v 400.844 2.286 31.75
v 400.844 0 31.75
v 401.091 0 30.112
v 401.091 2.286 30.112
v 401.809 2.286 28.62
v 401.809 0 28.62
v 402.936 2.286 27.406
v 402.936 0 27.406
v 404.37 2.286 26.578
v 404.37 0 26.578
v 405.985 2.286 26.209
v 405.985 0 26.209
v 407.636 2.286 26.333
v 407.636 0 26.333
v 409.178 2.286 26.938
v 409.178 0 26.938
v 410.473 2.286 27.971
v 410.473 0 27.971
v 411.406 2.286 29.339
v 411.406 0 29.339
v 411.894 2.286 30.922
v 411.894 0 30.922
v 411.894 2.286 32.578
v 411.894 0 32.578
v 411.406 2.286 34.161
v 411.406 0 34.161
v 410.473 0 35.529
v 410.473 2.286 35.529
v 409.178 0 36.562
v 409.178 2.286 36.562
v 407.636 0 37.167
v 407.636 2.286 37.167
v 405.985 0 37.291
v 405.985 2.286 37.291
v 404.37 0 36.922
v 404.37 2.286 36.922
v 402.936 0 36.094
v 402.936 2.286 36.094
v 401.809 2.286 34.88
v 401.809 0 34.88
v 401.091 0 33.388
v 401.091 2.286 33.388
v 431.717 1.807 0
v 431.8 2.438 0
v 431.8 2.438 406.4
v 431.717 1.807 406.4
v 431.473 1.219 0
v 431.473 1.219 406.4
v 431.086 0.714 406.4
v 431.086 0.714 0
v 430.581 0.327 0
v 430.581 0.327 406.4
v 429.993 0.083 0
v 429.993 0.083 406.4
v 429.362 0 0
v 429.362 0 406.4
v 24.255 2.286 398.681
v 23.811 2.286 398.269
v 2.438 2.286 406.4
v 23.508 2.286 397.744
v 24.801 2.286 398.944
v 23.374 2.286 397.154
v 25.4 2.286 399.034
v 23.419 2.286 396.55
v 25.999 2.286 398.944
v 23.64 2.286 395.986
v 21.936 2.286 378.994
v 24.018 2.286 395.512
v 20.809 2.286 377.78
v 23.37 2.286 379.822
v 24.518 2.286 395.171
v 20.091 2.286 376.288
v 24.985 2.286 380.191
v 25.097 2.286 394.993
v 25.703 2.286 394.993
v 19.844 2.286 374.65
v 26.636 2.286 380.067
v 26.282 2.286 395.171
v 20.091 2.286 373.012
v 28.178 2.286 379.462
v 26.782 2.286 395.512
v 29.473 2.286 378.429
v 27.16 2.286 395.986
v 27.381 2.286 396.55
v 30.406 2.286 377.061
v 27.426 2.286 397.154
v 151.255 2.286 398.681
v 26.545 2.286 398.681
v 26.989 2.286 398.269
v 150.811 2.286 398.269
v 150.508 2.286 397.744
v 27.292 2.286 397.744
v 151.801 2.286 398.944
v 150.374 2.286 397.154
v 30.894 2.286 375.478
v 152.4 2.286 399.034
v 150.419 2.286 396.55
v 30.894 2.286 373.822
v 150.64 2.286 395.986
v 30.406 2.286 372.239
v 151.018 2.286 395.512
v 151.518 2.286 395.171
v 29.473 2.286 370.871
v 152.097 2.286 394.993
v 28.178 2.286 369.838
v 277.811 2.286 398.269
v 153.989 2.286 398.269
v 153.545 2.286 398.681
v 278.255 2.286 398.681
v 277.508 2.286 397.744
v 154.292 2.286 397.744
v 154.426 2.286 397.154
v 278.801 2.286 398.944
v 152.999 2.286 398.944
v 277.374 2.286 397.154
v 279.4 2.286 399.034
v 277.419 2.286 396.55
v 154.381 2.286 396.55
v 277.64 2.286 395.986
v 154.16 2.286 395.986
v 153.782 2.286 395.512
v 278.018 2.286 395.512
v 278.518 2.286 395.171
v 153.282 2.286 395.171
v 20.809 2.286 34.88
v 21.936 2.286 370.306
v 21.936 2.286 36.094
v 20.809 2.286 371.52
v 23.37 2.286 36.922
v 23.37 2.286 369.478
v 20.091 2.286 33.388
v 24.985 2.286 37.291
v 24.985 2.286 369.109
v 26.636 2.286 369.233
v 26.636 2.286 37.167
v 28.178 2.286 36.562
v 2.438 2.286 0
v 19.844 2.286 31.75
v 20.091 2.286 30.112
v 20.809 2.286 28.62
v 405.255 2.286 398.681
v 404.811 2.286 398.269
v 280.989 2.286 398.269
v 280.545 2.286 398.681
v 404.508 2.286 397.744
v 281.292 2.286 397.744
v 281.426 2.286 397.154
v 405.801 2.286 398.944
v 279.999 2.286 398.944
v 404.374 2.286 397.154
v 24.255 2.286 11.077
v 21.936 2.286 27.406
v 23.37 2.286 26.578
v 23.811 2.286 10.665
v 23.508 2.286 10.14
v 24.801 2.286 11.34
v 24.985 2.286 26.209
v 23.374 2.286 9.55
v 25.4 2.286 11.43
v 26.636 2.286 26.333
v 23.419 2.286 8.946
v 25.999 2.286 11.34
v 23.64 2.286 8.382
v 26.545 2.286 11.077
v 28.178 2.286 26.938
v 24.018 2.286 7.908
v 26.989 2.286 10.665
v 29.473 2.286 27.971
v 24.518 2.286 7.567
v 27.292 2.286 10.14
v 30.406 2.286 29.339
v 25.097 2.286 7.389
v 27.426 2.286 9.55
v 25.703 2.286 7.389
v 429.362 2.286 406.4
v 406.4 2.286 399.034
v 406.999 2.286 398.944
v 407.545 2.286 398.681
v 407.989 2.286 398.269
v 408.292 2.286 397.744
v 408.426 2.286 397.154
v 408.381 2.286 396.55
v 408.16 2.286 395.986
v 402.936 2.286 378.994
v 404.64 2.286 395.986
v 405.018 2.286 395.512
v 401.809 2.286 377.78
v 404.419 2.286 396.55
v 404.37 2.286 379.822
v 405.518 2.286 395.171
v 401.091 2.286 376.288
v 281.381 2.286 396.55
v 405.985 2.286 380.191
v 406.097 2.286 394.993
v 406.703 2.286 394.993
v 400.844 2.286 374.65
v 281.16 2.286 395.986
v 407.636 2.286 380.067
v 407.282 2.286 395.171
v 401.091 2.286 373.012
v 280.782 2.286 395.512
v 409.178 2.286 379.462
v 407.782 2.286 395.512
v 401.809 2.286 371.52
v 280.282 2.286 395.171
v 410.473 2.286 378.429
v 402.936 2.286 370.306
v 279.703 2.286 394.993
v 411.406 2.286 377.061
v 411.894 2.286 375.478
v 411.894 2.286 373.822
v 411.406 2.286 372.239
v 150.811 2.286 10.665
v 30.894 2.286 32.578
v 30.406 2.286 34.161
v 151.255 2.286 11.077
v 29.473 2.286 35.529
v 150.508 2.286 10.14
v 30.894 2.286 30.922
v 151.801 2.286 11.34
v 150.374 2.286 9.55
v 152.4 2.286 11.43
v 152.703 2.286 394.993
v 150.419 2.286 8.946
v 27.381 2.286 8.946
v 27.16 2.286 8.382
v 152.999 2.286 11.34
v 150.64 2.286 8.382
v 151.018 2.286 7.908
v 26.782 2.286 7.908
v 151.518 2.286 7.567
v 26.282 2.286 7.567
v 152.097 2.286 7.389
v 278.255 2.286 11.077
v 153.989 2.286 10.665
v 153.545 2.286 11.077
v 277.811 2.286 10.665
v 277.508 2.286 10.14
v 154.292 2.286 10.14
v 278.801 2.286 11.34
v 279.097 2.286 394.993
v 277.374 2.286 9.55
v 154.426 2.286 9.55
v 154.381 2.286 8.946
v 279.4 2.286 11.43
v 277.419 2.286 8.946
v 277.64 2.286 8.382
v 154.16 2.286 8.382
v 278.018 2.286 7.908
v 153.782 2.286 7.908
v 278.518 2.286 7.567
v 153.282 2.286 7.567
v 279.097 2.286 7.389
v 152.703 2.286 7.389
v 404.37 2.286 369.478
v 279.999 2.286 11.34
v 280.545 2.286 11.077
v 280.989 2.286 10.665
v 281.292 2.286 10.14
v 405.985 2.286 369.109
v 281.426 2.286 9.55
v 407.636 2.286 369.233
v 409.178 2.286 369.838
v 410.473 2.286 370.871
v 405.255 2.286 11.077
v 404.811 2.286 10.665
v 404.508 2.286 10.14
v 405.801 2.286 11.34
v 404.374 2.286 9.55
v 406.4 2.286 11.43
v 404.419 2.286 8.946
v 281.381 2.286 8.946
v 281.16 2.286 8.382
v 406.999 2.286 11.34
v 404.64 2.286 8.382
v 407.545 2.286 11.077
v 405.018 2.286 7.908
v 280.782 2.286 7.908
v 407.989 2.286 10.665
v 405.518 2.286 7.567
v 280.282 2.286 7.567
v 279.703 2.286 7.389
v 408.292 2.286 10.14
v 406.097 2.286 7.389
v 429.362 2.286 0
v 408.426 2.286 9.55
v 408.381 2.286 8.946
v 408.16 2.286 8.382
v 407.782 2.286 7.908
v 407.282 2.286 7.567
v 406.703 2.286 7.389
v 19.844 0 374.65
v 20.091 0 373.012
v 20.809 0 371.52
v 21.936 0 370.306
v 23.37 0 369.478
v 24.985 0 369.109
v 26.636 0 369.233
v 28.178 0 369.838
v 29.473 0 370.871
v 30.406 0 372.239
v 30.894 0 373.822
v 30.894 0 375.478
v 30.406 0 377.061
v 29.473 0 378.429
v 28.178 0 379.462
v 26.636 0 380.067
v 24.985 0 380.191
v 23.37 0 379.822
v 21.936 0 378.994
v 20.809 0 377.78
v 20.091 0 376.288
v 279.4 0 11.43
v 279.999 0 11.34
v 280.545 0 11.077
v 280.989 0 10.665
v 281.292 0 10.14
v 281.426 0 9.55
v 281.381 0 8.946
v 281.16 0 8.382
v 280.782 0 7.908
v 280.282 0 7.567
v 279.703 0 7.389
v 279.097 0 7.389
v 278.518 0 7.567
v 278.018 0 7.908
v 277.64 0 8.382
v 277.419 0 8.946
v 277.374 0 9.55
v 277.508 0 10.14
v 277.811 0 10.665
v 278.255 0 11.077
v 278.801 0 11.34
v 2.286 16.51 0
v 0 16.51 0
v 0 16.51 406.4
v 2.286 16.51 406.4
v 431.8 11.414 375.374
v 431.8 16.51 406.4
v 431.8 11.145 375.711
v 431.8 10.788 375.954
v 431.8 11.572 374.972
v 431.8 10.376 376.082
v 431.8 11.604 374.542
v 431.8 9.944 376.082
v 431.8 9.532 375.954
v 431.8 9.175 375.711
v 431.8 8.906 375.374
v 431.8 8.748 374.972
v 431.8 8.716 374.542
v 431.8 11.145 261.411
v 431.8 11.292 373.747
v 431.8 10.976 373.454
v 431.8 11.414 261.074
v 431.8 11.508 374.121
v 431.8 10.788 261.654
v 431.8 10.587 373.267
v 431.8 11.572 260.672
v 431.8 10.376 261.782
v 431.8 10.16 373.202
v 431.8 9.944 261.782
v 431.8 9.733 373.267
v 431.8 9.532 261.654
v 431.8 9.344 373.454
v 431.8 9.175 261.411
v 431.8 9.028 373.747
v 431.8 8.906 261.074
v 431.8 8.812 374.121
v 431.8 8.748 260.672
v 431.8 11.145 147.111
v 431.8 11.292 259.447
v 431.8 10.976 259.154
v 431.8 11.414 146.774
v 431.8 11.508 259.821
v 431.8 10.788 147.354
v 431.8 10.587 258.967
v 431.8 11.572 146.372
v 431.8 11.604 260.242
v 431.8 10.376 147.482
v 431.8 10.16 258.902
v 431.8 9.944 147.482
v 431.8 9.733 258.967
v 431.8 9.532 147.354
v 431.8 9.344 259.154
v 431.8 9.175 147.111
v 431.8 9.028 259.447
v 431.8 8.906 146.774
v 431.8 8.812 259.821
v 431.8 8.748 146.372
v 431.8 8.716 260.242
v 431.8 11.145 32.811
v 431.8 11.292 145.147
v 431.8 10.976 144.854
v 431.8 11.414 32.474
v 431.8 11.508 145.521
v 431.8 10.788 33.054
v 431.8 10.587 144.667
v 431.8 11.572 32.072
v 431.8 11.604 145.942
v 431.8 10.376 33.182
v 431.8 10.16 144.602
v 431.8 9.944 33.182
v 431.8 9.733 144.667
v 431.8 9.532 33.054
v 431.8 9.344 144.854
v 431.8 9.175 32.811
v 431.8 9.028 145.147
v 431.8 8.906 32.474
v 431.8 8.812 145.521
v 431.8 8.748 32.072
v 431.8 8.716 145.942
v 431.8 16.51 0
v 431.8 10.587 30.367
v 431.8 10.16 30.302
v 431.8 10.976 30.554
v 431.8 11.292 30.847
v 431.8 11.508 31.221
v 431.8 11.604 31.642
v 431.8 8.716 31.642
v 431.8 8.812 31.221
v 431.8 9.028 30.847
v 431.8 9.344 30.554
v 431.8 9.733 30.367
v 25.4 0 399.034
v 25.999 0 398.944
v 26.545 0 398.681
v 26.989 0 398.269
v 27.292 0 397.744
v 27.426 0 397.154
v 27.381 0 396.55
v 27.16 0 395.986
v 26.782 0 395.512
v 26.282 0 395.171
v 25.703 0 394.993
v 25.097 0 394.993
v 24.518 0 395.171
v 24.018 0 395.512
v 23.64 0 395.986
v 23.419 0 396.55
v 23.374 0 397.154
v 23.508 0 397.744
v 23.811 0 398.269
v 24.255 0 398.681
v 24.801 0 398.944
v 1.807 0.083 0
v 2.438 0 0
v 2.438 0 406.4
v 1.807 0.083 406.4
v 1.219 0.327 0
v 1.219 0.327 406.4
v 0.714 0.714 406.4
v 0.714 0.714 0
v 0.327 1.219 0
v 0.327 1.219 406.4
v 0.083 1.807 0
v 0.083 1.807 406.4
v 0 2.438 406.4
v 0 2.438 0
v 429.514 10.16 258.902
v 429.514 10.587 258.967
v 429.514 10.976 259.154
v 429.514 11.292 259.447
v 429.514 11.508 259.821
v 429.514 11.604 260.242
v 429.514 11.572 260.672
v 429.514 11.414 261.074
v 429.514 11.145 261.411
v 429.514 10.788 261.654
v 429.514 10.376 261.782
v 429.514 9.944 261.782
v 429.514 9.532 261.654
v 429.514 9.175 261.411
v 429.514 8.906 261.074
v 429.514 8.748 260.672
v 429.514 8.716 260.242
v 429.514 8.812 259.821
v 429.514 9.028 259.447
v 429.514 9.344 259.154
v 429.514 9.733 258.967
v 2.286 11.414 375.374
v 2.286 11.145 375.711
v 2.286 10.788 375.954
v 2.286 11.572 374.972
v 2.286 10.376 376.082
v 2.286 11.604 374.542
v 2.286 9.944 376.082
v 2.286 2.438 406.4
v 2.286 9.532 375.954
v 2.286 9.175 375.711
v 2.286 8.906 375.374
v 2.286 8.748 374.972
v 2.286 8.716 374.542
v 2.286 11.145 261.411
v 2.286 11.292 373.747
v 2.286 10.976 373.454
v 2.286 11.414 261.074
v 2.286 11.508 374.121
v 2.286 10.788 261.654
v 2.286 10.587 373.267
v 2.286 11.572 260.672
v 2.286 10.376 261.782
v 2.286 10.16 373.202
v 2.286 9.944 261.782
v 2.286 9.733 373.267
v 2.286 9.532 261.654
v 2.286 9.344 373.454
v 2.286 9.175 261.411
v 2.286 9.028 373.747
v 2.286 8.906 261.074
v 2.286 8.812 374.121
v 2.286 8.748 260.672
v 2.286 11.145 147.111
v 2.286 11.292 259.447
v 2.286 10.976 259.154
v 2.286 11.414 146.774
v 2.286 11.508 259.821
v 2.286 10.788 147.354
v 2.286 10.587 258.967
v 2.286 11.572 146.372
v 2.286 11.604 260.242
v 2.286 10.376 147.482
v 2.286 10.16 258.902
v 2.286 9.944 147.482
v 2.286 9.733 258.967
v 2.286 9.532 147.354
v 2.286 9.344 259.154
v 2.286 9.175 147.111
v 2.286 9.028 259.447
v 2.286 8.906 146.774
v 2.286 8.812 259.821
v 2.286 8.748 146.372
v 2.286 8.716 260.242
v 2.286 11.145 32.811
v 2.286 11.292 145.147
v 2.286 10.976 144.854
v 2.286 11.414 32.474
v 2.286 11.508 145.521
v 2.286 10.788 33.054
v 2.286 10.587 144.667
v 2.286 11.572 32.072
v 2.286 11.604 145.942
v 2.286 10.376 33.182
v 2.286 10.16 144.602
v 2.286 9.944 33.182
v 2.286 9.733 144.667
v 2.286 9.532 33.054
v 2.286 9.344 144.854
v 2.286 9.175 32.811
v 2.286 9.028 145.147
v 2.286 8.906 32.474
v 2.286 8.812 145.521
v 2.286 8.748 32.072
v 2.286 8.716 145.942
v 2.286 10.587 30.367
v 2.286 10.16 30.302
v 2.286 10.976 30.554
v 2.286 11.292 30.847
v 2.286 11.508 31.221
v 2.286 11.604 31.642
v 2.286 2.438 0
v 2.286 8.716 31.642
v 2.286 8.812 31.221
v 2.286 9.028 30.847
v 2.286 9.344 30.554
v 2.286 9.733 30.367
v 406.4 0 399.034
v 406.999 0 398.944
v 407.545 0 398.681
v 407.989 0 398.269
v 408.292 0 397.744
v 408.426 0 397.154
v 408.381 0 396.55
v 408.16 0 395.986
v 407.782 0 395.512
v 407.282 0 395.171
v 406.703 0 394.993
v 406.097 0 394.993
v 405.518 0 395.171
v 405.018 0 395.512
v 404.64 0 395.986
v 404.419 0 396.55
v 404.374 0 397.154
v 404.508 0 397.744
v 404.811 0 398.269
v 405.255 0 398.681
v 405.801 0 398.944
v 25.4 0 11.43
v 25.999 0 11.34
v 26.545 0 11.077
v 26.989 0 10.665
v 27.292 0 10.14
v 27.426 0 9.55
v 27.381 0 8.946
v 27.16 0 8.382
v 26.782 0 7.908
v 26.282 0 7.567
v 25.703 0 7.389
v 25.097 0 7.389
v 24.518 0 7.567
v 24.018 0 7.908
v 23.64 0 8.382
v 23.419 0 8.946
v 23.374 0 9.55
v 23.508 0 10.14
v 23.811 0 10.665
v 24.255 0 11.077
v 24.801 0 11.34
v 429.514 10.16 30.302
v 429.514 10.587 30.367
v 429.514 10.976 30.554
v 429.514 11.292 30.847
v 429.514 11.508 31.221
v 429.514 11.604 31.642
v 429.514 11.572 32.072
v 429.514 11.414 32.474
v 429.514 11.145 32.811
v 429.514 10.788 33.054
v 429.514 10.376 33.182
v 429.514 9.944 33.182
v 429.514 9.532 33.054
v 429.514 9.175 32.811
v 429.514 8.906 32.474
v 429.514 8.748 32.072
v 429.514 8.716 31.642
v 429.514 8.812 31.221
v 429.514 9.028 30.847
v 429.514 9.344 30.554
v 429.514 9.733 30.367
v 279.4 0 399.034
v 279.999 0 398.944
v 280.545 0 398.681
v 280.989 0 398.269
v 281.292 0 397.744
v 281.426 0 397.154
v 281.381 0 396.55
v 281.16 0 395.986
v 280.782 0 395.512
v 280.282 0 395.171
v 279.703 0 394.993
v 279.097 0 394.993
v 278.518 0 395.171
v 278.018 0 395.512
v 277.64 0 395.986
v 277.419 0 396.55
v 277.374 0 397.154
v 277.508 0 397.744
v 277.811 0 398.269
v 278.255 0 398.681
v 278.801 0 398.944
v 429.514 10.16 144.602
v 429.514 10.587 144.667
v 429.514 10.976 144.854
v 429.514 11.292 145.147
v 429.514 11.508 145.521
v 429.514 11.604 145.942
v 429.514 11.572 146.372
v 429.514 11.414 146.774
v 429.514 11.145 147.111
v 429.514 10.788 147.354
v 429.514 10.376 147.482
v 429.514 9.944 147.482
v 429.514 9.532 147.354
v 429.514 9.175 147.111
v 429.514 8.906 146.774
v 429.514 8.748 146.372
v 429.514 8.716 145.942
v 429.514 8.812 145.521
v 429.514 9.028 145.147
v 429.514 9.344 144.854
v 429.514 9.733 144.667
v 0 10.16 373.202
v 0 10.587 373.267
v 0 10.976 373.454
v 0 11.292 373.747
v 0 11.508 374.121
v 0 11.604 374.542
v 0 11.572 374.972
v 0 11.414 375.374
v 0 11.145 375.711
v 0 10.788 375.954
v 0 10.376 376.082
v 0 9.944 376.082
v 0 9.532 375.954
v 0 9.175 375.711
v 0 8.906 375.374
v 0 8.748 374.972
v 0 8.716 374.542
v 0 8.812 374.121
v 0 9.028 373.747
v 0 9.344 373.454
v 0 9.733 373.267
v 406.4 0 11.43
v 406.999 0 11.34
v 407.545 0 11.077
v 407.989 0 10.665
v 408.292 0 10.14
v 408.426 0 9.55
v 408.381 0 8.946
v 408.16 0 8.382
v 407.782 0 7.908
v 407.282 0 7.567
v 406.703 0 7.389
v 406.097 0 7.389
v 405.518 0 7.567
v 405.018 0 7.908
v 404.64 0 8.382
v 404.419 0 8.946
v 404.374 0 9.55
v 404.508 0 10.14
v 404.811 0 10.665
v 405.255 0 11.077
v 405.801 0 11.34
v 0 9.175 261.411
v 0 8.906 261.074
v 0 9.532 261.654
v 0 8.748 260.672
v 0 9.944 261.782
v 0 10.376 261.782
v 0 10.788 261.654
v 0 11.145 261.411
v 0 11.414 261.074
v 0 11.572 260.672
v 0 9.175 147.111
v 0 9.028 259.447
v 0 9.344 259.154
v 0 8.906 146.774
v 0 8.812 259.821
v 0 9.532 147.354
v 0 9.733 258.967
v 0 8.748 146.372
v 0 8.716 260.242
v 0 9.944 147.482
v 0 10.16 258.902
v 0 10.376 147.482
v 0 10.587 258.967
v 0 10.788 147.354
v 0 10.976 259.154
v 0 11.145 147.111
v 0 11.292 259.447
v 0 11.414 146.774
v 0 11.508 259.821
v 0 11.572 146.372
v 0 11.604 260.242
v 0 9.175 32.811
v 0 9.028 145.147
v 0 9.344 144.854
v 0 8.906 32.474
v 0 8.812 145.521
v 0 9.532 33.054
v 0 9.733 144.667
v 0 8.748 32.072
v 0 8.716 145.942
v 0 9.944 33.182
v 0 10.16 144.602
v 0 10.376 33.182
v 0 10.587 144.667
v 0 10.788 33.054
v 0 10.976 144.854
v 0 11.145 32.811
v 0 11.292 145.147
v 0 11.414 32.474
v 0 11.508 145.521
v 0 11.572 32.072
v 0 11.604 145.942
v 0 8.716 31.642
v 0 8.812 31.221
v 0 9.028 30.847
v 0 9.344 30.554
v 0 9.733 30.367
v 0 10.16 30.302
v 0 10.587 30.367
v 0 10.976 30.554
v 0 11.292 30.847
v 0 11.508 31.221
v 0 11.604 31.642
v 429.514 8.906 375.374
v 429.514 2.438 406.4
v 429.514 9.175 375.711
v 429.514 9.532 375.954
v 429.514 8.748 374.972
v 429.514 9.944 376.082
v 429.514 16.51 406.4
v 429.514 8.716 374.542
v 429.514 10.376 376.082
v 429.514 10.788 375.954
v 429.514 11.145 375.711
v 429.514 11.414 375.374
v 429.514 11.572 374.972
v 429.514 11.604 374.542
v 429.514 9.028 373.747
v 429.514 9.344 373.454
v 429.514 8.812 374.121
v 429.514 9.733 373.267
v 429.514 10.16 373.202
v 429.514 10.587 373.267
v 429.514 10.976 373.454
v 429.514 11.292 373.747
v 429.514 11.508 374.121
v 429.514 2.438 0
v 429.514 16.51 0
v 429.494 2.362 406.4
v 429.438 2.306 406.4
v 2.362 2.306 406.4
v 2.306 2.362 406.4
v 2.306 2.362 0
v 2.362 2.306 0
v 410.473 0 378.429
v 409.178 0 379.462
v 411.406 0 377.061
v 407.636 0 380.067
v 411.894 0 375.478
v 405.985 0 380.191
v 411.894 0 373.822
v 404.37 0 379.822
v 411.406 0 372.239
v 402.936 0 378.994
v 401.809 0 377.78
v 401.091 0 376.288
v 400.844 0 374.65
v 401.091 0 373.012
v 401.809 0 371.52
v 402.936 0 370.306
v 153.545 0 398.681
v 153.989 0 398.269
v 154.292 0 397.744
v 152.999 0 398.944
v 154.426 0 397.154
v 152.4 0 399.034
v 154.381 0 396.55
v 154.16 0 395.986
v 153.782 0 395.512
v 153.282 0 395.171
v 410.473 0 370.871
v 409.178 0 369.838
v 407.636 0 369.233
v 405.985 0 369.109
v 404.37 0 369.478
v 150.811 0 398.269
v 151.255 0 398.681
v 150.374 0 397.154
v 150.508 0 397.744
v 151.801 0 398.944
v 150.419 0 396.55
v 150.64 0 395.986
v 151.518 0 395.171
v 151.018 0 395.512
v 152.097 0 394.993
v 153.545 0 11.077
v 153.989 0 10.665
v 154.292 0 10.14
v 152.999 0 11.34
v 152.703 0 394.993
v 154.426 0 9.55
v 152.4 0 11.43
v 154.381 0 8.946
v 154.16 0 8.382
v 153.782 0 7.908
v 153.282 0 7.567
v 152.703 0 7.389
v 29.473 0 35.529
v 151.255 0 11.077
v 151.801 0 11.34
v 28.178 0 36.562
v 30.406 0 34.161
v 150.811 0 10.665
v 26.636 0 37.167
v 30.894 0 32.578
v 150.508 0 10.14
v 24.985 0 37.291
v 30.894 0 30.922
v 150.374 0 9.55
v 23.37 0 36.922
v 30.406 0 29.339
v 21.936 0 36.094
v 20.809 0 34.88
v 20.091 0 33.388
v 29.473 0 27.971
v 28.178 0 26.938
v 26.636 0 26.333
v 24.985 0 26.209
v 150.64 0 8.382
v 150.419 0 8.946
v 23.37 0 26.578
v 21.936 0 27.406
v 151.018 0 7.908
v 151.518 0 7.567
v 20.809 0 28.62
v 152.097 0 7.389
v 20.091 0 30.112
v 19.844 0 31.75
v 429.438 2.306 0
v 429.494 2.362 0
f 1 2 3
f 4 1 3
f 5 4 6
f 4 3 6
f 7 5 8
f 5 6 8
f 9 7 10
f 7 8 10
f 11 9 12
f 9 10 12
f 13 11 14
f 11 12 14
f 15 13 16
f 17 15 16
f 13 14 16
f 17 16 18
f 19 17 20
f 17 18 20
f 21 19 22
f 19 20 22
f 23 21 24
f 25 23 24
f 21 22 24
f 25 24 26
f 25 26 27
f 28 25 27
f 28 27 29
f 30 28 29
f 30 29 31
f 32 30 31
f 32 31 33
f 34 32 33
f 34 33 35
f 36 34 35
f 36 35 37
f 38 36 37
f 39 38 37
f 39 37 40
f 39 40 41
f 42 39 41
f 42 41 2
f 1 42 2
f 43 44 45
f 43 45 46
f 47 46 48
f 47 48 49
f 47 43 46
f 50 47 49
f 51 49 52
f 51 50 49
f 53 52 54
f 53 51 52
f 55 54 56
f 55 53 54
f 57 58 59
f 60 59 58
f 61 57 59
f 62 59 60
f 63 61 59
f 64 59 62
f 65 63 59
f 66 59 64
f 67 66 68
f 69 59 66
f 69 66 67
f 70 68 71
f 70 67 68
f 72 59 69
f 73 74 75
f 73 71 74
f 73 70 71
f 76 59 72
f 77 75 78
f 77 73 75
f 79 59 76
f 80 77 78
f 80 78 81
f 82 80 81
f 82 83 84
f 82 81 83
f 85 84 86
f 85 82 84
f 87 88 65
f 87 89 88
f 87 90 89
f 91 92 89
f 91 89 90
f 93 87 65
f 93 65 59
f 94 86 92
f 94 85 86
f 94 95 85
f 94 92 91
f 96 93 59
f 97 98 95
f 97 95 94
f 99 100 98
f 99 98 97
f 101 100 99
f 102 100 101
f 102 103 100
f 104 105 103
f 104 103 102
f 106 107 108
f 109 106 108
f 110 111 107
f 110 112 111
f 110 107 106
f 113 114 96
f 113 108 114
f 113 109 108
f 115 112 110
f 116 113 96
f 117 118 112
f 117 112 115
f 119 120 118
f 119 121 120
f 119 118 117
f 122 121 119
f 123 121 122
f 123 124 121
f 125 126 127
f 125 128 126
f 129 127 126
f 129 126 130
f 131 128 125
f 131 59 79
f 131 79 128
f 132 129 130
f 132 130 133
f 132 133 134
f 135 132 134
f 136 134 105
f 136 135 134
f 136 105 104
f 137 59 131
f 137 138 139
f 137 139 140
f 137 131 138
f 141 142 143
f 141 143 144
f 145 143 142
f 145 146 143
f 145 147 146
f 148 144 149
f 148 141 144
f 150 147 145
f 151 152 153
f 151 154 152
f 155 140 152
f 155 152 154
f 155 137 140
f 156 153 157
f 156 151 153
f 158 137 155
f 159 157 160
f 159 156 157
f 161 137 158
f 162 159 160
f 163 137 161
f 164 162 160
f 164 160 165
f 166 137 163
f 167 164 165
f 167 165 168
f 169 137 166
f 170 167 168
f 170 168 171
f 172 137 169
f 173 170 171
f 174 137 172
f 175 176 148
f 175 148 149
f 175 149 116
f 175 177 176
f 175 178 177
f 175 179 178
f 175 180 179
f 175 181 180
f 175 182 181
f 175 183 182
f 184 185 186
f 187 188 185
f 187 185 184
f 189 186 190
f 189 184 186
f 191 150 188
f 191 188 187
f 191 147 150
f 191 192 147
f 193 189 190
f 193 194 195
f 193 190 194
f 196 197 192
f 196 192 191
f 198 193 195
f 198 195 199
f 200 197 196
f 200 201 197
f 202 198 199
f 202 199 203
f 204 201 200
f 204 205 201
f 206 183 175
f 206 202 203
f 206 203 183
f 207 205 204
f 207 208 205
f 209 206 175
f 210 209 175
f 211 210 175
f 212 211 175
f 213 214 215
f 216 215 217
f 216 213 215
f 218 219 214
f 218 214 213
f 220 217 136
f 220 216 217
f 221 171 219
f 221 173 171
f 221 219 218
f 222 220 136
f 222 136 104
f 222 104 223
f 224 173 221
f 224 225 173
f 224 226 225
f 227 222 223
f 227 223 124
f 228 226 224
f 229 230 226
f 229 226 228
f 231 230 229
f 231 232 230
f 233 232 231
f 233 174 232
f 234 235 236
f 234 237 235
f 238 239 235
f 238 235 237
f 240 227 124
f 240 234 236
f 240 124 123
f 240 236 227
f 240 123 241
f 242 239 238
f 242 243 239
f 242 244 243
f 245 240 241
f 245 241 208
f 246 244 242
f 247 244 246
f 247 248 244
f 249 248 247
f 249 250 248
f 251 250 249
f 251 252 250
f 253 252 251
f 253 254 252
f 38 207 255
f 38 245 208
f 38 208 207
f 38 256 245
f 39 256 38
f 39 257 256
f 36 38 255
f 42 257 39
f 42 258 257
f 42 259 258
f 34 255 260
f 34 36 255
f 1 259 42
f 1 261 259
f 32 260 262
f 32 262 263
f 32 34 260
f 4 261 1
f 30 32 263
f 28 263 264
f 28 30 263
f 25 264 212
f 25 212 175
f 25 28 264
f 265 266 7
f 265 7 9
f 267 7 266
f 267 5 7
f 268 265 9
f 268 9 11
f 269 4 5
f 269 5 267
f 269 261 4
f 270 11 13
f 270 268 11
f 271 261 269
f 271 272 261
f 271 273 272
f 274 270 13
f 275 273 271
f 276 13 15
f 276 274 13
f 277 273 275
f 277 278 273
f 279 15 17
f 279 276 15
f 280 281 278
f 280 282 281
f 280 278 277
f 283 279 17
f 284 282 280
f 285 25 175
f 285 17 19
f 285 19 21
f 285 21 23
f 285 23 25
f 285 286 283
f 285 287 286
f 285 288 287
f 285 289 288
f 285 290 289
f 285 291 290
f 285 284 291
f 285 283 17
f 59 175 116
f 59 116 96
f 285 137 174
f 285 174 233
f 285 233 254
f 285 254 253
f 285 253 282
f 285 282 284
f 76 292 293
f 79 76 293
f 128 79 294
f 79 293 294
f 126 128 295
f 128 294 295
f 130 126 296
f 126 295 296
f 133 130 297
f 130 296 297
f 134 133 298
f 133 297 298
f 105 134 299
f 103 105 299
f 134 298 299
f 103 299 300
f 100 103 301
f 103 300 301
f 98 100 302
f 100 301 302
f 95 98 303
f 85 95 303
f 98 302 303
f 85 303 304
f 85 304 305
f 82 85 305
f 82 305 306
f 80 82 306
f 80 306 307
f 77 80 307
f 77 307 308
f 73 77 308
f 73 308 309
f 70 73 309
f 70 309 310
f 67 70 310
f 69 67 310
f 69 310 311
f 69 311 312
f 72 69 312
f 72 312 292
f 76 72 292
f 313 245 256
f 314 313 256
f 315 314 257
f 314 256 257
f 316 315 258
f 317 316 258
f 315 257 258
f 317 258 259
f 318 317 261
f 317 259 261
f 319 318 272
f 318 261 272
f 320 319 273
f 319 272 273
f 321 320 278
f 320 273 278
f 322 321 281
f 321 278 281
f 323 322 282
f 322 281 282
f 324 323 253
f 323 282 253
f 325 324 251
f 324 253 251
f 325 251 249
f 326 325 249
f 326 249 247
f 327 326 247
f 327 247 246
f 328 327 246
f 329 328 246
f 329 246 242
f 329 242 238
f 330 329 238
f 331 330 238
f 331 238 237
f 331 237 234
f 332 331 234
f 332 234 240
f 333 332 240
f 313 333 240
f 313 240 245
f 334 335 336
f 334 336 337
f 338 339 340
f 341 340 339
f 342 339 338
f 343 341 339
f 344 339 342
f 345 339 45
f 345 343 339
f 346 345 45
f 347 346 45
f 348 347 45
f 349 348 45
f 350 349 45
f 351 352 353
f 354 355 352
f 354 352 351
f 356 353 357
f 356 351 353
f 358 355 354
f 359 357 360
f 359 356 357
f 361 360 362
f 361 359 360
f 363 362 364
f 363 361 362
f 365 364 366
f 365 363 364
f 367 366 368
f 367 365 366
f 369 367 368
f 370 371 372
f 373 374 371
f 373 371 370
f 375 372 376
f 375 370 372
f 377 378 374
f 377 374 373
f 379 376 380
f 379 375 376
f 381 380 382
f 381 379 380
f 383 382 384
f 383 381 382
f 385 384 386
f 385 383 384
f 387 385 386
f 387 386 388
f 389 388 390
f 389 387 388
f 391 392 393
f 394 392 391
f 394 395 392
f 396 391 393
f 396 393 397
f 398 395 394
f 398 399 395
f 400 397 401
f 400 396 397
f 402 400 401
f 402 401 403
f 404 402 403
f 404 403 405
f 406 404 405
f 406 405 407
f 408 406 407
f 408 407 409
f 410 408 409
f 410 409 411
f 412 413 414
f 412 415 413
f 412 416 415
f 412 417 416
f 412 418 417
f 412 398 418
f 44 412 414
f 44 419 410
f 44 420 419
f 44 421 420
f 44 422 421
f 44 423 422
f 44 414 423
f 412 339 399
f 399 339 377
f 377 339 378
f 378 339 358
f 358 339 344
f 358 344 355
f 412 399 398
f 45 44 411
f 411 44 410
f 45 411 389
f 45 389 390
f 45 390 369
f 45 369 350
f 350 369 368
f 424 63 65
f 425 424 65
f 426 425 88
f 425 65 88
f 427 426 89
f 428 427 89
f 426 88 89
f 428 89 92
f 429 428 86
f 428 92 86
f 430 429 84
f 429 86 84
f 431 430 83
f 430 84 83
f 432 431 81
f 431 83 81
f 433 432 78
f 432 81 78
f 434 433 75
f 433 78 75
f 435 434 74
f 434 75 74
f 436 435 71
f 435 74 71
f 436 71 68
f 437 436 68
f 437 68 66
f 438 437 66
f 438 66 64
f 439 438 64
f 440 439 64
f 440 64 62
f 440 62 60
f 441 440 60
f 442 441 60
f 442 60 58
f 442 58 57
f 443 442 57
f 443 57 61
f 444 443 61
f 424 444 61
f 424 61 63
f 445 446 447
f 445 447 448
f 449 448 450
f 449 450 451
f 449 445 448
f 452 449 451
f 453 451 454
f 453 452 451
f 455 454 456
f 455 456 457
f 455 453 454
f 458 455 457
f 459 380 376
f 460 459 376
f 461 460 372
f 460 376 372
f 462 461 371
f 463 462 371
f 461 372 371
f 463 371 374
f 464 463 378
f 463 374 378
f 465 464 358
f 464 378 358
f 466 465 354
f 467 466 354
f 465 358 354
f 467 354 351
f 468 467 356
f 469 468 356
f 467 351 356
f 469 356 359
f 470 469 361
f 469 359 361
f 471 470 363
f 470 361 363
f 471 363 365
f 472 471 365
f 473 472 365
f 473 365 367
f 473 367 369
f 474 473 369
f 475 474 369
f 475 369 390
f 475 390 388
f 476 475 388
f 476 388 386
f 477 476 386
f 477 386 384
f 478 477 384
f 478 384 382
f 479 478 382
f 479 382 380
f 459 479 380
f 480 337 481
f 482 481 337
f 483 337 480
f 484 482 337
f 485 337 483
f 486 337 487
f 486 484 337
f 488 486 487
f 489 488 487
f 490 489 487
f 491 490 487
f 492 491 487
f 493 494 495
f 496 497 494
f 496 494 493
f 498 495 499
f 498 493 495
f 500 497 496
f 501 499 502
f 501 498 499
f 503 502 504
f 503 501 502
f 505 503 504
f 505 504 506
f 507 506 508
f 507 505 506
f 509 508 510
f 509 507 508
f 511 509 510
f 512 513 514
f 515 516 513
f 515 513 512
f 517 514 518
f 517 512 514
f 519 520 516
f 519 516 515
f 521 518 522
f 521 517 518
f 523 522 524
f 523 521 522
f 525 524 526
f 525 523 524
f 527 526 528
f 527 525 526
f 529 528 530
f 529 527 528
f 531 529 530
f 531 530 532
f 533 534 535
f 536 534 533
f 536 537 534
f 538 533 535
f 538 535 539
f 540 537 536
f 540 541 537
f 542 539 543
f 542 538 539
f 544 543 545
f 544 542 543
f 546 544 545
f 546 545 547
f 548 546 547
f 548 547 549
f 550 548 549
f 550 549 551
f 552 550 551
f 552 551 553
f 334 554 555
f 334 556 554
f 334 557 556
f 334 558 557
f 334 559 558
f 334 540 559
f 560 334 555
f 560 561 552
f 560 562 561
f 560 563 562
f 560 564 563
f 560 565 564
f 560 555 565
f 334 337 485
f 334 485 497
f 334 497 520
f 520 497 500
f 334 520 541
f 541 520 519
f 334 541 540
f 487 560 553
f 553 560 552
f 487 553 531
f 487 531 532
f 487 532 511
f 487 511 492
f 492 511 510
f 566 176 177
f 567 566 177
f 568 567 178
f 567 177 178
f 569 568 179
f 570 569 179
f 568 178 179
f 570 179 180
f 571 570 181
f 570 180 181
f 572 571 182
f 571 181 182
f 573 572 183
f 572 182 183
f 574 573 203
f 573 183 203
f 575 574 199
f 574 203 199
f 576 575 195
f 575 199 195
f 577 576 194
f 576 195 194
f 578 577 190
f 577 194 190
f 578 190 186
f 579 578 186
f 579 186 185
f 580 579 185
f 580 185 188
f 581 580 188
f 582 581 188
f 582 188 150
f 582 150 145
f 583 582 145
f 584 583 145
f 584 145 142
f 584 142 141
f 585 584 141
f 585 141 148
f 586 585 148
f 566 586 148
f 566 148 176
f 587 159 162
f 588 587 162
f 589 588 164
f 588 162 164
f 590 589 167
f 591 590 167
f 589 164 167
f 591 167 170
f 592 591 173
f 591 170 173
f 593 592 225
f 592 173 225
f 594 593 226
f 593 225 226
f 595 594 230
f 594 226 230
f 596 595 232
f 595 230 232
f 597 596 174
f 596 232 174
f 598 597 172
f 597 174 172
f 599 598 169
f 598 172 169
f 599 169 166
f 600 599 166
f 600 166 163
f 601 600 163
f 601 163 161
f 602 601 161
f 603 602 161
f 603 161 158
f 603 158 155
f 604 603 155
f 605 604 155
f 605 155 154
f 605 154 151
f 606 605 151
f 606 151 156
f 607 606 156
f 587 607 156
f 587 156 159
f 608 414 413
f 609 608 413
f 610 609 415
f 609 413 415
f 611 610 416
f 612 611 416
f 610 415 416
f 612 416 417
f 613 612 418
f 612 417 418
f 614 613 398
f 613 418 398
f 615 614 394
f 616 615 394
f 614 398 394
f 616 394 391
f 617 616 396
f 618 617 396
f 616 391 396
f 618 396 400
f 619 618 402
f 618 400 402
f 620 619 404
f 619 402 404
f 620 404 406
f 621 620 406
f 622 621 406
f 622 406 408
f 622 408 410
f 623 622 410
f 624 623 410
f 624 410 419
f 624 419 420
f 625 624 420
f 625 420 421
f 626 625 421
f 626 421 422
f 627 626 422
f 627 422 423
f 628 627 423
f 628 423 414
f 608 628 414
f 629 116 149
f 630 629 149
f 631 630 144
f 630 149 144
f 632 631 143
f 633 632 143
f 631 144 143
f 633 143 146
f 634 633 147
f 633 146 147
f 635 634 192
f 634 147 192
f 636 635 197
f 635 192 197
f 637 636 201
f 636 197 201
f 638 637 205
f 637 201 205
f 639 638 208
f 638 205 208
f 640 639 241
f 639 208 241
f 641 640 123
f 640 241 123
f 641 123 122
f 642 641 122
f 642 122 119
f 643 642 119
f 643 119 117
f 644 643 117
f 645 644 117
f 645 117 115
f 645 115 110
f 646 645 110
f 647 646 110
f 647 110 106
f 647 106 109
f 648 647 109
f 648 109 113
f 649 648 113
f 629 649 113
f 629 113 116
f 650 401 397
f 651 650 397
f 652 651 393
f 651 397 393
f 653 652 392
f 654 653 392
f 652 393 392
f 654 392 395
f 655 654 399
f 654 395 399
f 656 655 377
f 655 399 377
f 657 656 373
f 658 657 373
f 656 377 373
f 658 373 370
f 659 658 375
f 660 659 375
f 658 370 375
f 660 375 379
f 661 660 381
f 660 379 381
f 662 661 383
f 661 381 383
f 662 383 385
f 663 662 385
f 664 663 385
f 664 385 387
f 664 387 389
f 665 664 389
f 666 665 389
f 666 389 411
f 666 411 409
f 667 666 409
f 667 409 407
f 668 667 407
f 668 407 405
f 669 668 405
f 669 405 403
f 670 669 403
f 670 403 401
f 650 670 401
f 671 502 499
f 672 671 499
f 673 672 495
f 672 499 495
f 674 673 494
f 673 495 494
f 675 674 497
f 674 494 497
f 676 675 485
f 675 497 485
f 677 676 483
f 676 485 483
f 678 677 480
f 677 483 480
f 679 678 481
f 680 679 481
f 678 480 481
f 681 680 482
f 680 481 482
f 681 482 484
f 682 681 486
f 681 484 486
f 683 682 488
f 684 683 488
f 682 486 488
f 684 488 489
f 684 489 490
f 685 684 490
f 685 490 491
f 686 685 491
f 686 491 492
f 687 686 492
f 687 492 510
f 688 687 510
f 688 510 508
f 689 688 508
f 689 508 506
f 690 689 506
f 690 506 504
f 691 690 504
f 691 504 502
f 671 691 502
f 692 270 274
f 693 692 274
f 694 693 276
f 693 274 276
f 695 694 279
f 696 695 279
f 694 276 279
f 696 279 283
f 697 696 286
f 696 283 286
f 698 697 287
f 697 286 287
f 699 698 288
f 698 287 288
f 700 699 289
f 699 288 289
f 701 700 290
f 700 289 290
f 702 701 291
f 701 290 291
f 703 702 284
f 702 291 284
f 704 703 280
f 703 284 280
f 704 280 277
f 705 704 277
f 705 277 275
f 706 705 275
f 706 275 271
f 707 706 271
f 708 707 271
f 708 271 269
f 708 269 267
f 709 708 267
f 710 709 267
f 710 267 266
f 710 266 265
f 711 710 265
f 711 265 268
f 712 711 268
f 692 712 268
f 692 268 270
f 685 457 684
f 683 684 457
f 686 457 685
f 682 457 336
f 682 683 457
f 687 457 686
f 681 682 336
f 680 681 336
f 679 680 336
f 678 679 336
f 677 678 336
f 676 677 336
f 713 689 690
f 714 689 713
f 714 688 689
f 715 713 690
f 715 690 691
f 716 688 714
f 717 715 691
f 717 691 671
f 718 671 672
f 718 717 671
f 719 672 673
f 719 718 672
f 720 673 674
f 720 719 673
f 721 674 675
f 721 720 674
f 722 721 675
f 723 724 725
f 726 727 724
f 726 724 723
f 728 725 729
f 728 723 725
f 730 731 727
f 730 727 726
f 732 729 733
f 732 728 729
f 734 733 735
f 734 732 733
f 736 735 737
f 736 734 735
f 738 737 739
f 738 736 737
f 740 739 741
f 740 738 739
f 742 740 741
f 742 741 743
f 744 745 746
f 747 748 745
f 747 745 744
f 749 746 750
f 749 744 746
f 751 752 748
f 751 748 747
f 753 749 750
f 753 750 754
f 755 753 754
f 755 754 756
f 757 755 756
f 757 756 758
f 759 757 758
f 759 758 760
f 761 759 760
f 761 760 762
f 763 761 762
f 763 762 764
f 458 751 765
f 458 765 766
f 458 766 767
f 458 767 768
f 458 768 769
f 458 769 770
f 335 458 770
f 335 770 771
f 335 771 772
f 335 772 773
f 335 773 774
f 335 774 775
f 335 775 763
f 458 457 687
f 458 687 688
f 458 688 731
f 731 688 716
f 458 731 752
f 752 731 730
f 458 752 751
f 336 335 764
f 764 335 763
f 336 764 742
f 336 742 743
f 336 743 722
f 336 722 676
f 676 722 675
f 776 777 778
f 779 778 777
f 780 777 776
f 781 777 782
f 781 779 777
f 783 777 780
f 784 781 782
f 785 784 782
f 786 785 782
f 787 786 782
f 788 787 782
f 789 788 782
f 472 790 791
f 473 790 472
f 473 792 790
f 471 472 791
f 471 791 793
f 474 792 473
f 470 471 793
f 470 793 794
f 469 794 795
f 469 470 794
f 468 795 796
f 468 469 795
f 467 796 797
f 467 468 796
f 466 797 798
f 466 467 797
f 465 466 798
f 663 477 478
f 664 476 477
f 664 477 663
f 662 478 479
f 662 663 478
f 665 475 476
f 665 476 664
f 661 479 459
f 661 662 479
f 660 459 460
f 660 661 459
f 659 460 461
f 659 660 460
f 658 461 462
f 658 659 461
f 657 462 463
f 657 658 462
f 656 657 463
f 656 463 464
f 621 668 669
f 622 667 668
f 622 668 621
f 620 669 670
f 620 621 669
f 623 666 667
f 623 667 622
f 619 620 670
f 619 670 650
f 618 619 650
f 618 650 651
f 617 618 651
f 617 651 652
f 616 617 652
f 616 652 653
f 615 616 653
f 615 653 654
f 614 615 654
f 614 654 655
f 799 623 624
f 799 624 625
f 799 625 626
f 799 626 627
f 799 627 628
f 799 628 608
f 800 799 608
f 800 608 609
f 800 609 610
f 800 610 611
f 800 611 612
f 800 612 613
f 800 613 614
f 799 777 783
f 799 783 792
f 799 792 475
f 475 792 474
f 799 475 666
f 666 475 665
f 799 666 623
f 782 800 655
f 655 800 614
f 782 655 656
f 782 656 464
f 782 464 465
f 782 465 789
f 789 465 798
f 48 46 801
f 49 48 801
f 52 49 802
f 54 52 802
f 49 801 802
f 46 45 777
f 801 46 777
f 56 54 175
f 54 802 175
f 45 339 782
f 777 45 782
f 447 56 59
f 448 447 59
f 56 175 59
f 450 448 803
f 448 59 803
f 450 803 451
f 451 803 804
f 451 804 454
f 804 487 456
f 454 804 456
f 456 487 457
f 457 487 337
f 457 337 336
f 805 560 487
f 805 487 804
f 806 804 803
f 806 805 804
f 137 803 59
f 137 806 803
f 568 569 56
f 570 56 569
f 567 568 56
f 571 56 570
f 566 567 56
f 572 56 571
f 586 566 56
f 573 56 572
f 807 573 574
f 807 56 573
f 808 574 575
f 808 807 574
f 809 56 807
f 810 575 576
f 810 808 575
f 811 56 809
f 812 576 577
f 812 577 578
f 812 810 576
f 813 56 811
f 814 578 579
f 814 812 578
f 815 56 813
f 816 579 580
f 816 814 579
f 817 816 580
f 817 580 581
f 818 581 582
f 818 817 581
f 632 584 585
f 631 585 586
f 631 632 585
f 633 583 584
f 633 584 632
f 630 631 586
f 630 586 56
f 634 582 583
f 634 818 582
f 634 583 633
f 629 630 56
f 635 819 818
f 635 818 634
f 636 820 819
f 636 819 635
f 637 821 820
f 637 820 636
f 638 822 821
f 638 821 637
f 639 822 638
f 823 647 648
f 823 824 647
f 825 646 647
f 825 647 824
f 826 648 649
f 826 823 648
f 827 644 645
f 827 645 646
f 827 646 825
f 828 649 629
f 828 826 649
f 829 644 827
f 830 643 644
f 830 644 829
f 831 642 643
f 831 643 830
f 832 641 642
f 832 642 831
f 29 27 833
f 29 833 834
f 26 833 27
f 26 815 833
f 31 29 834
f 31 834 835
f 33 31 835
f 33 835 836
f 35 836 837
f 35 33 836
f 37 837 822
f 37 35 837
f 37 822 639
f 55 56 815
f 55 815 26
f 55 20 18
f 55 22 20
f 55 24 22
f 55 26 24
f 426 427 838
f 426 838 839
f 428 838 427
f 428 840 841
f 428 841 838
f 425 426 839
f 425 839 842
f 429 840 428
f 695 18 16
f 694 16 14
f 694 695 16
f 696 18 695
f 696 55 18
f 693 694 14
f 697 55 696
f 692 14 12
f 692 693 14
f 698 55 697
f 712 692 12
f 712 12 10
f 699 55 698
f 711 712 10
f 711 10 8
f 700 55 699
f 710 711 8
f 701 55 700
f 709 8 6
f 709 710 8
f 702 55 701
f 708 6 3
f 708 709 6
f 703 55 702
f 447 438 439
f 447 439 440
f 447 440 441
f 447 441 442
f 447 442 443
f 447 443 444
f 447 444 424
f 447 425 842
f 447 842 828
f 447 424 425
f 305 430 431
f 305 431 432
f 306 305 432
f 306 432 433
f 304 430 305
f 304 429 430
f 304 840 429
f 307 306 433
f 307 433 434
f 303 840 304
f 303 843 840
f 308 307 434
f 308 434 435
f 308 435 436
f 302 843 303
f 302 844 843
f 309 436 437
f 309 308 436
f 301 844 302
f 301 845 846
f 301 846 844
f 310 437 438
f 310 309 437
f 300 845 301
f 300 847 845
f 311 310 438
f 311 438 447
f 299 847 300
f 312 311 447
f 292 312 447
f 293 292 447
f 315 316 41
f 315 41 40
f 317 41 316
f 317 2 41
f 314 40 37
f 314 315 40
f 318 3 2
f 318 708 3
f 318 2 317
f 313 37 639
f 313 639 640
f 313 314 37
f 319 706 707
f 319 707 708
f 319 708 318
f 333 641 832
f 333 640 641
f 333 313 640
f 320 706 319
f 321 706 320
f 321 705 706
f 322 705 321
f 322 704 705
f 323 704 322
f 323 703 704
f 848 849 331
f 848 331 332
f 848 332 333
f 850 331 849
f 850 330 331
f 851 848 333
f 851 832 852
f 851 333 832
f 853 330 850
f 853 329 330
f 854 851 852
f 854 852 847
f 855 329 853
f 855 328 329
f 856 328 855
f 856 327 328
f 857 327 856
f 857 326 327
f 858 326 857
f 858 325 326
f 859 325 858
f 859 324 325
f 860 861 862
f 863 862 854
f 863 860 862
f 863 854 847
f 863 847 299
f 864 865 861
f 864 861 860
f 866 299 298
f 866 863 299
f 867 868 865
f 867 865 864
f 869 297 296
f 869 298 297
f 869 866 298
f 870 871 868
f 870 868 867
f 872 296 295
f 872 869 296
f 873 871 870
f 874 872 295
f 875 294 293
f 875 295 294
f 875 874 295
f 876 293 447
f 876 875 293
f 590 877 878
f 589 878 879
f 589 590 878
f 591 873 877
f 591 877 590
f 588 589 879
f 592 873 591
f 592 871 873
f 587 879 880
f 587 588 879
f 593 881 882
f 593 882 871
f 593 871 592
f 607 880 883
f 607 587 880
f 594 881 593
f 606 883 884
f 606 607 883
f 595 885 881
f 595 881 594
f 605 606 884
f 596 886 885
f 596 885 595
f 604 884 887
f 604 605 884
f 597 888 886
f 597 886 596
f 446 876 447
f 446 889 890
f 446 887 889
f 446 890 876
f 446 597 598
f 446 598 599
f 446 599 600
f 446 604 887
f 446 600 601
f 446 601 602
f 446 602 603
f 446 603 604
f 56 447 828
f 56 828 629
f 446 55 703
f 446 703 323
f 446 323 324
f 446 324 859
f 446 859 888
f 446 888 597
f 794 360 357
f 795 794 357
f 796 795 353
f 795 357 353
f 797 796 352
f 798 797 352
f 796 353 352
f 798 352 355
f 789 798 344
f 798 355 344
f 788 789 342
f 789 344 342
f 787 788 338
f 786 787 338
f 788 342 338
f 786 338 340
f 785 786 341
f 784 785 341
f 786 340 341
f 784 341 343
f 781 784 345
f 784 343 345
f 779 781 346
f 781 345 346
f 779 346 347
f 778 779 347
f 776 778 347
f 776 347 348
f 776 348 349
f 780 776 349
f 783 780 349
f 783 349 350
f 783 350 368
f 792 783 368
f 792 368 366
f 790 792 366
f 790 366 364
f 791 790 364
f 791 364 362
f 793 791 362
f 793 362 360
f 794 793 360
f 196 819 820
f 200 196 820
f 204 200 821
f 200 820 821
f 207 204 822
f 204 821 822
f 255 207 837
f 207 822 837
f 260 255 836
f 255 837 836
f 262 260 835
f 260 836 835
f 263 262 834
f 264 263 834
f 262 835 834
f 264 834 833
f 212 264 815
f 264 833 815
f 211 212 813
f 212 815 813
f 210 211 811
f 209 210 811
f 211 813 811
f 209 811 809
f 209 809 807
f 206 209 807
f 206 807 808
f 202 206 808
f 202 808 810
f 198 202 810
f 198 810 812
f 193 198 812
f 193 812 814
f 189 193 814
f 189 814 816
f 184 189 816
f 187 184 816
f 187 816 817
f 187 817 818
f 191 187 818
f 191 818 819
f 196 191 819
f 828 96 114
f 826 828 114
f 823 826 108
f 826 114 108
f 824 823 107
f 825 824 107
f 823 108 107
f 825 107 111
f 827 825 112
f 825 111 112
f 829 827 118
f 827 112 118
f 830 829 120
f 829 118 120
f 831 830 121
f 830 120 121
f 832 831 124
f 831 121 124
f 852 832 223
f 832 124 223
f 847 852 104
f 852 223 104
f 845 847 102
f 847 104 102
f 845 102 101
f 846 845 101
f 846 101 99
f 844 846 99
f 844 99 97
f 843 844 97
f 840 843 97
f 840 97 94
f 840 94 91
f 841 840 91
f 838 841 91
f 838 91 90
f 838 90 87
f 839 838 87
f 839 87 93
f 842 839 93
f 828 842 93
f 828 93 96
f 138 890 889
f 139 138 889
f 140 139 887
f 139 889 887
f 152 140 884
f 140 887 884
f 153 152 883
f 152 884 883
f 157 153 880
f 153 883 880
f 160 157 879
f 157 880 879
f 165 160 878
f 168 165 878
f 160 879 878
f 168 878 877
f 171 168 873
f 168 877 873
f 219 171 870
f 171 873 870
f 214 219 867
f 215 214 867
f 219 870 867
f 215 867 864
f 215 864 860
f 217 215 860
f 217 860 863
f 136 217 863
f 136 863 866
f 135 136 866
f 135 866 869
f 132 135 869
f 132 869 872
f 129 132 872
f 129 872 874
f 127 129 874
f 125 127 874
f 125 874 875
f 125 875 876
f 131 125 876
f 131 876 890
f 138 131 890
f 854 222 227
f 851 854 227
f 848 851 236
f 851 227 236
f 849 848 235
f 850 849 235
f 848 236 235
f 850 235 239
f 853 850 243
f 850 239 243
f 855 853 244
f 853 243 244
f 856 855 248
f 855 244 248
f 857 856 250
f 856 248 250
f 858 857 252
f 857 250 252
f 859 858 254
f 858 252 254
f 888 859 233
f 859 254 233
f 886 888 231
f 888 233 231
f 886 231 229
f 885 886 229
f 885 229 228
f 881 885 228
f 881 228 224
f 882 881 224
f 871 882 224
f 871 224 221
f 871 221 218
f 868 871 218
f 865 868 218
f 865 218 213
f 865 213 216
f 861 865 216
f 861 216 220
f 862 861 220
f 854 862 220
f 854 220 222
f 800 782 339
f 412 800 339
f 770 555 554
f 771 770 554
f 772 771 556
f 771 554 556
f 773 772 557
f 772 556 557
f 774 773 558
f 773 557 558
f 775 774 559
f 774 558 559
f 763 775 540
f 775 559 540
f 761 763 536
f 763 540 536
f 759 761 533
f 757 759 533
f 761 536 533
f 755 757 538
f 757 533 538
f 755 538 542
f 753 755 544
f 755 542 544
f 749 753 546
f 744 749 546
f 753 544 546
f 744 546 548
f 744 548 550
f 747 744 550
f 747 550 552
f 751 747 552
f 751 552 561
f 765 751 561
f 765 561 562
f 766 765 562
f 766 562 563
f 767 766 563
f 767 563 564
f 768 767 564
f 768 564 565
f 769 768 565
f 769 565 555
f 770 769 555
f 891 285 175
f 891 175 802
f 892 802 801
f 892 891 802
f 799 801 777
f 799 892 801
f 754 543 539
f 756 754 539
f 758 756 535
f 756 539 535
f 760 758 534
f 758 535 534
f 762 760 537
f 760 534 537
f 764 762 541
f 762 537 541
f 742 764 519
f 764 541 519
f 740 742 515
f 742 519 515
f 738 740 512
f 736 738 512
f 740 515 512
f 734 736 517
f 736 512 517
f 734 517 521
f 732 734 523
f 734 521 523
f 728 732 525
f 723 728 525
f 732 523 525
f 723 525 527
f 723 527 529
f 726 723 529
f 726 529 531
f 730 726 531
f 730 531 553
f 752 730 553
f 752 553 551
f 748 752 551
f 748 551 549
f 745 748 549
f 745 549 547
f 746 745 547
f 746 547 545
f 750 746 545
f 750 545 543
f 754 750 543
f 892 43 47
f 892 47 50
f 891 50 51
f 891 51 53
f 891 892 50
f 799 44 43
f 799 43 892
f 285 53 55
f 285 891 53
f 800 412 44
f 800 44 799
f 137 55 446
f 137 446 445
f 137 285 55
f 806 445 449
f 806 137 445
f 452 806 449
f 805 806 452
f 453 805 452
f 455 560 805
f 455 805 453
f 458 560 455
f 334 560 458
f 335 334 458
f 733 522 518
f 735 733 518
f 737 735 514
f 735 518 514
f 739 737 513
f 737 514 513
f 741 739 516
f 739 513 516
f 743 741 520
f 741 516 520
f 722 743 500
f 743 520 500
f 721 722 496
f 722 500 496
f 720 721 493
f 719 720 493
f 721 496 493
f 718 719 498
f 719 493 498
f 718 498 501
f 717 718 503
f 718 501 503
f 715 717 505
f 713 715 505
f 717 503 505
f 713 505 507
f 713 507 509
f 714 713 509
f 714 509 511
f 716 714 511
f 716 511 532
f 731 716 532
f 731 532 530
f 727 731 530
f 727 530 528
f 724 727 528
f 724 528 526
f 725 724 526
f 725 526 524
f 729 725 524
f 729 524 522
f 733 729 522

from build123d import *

# Parameters (mm, degrees)
BASE_FLANGE3_DEPTH             = 406.4
SKETCH10_R                     = 1.4478
CUT_EXTRUDE3_DEPTH             = 594.198769469
SKETCH11_R                     = 2.032
CUT_EXTRUDE4_DEPTH             = 594.139546967
F_7_16_0_4375_DIAMETER_HOLE1_D = 11.1125


# Sheet-metal steps are written as plain solids
with BuildPart() as part:
    # Sketch1 → Base-Flange3 (new body)
    with BuildSketch(Plane.XY):
        with BuildLine():
            Line((431.8, 16.51), (431.8, 2.4384))
            ThreePointArc((431.8, 2.4384), (431.085809175, 0.714190825), (429.3616, 0))
            Line((429.3616, 0), (2.4384, 0))
            ThreePointArc((2.4384, 0), (0.714190825, 0.714190825), (0, 2.4384))
            Line((0, 2.4384), (0, 16.51))
            Line((0, 16.51), (2.286, 16.51))
            Line((2.286, 16.51), (2.286, 2.4384))
            ThreePointArc((2.286, 2.4384), (2.330636927, 2.330636927), (2.4384, 2.286))
            Line((2.4384, 2.286), (429.3616, 2.286))
            ThreePointArc((429.3616, 2.286), (429.469363073, 2.330636927), (429.514, 2.4384))
            Line((429.514, 2.4384), (429.514, 16.51))
            Line((429.514, 16.51), (431.8, 16.51))
        make_face()
    extrude(amount=BASE_FLANGE3_DEPTH)

    # Sketch10 → Cut-Extrude3 (cut, through all)
    with BuildSketch(Plane(origin=(431.8, 0, 0), x_dir=(0, 0, -1), z_dir=(1, 0, 0))):
        with Locations((-31.75, 10.16)):
            Circle(SKETCH10_R)
        with Locations((-146.05, 10.16)):
            Circle(SKETCH10_R)
        with Locations((-260.35, 10.16)):
            Circle(SKETCH10_R)
        with Locations((-374.65, 10.16)):
            Circle(SKETCH10_R)
    extrude(amount=-CUT_EXTRUDE3_DEPTH, mode=Mode.SUBTRACT)

    # Sketch11 → Cut-Extrude4 (cut, through all)
    with BuildSketch(Plane(origin=(0, 2.286, 0), x_dir=(-1, 0, 0), z_dir=(0, 1, 0))):
        with Locations(Location((-406.4, 397.002, 0), (0, 0, 90))):
            Circle(SKETCH11_R)
        with Locations(Location((-279.4, 397.002, 0), (0, 0, 90))):
            Circle(SKETCH11_R)
        with Locations(Location((-152.4, 397.002, 0), (0, 0, 90))):
            Circle(SKETCH11_R)
        with Locations(Location((-25.4, 397.002, 0), (0, 0, 90))):
            Circle(SKETCH11_R)
        with Locations(Location((-406.4, 9.398, 0), (0, 0, 90))):
            Circle(SKETCH11_R)
        with Locations(Location((-279.4, 9.398, 0), (0, 0, 90))):
            Circle(SKETCH11_R)
        with Locations(Location((-152.4, 9.398, 0), (0, 0, 90))):
            Circle(SKETCH11_R)
        with Locations(Location((-25.4, 9.398, 0), (0, 0, 90))):
            Circle(SKETCH11_R)
    extrude(amount=-CUT_EXTRUDE4_DEPTH, mode=Mode.SUBTRACT)

    # 7/16 (0.4375) Diameter Hole1 (through all)
    with Locations(Plane(origin=(0, 2.286, 0), x_dir=(1, 0, 0), z_dir=(0, 1, 0))):
        with Locations((25.4, -31.75), (406.4, -31.75), (406.4, -374.65), (25.4, -374.65)):
            Hole(F_7_16_0_4375_DIAMETER_HOLE1_D / 2)


solid = part.part
